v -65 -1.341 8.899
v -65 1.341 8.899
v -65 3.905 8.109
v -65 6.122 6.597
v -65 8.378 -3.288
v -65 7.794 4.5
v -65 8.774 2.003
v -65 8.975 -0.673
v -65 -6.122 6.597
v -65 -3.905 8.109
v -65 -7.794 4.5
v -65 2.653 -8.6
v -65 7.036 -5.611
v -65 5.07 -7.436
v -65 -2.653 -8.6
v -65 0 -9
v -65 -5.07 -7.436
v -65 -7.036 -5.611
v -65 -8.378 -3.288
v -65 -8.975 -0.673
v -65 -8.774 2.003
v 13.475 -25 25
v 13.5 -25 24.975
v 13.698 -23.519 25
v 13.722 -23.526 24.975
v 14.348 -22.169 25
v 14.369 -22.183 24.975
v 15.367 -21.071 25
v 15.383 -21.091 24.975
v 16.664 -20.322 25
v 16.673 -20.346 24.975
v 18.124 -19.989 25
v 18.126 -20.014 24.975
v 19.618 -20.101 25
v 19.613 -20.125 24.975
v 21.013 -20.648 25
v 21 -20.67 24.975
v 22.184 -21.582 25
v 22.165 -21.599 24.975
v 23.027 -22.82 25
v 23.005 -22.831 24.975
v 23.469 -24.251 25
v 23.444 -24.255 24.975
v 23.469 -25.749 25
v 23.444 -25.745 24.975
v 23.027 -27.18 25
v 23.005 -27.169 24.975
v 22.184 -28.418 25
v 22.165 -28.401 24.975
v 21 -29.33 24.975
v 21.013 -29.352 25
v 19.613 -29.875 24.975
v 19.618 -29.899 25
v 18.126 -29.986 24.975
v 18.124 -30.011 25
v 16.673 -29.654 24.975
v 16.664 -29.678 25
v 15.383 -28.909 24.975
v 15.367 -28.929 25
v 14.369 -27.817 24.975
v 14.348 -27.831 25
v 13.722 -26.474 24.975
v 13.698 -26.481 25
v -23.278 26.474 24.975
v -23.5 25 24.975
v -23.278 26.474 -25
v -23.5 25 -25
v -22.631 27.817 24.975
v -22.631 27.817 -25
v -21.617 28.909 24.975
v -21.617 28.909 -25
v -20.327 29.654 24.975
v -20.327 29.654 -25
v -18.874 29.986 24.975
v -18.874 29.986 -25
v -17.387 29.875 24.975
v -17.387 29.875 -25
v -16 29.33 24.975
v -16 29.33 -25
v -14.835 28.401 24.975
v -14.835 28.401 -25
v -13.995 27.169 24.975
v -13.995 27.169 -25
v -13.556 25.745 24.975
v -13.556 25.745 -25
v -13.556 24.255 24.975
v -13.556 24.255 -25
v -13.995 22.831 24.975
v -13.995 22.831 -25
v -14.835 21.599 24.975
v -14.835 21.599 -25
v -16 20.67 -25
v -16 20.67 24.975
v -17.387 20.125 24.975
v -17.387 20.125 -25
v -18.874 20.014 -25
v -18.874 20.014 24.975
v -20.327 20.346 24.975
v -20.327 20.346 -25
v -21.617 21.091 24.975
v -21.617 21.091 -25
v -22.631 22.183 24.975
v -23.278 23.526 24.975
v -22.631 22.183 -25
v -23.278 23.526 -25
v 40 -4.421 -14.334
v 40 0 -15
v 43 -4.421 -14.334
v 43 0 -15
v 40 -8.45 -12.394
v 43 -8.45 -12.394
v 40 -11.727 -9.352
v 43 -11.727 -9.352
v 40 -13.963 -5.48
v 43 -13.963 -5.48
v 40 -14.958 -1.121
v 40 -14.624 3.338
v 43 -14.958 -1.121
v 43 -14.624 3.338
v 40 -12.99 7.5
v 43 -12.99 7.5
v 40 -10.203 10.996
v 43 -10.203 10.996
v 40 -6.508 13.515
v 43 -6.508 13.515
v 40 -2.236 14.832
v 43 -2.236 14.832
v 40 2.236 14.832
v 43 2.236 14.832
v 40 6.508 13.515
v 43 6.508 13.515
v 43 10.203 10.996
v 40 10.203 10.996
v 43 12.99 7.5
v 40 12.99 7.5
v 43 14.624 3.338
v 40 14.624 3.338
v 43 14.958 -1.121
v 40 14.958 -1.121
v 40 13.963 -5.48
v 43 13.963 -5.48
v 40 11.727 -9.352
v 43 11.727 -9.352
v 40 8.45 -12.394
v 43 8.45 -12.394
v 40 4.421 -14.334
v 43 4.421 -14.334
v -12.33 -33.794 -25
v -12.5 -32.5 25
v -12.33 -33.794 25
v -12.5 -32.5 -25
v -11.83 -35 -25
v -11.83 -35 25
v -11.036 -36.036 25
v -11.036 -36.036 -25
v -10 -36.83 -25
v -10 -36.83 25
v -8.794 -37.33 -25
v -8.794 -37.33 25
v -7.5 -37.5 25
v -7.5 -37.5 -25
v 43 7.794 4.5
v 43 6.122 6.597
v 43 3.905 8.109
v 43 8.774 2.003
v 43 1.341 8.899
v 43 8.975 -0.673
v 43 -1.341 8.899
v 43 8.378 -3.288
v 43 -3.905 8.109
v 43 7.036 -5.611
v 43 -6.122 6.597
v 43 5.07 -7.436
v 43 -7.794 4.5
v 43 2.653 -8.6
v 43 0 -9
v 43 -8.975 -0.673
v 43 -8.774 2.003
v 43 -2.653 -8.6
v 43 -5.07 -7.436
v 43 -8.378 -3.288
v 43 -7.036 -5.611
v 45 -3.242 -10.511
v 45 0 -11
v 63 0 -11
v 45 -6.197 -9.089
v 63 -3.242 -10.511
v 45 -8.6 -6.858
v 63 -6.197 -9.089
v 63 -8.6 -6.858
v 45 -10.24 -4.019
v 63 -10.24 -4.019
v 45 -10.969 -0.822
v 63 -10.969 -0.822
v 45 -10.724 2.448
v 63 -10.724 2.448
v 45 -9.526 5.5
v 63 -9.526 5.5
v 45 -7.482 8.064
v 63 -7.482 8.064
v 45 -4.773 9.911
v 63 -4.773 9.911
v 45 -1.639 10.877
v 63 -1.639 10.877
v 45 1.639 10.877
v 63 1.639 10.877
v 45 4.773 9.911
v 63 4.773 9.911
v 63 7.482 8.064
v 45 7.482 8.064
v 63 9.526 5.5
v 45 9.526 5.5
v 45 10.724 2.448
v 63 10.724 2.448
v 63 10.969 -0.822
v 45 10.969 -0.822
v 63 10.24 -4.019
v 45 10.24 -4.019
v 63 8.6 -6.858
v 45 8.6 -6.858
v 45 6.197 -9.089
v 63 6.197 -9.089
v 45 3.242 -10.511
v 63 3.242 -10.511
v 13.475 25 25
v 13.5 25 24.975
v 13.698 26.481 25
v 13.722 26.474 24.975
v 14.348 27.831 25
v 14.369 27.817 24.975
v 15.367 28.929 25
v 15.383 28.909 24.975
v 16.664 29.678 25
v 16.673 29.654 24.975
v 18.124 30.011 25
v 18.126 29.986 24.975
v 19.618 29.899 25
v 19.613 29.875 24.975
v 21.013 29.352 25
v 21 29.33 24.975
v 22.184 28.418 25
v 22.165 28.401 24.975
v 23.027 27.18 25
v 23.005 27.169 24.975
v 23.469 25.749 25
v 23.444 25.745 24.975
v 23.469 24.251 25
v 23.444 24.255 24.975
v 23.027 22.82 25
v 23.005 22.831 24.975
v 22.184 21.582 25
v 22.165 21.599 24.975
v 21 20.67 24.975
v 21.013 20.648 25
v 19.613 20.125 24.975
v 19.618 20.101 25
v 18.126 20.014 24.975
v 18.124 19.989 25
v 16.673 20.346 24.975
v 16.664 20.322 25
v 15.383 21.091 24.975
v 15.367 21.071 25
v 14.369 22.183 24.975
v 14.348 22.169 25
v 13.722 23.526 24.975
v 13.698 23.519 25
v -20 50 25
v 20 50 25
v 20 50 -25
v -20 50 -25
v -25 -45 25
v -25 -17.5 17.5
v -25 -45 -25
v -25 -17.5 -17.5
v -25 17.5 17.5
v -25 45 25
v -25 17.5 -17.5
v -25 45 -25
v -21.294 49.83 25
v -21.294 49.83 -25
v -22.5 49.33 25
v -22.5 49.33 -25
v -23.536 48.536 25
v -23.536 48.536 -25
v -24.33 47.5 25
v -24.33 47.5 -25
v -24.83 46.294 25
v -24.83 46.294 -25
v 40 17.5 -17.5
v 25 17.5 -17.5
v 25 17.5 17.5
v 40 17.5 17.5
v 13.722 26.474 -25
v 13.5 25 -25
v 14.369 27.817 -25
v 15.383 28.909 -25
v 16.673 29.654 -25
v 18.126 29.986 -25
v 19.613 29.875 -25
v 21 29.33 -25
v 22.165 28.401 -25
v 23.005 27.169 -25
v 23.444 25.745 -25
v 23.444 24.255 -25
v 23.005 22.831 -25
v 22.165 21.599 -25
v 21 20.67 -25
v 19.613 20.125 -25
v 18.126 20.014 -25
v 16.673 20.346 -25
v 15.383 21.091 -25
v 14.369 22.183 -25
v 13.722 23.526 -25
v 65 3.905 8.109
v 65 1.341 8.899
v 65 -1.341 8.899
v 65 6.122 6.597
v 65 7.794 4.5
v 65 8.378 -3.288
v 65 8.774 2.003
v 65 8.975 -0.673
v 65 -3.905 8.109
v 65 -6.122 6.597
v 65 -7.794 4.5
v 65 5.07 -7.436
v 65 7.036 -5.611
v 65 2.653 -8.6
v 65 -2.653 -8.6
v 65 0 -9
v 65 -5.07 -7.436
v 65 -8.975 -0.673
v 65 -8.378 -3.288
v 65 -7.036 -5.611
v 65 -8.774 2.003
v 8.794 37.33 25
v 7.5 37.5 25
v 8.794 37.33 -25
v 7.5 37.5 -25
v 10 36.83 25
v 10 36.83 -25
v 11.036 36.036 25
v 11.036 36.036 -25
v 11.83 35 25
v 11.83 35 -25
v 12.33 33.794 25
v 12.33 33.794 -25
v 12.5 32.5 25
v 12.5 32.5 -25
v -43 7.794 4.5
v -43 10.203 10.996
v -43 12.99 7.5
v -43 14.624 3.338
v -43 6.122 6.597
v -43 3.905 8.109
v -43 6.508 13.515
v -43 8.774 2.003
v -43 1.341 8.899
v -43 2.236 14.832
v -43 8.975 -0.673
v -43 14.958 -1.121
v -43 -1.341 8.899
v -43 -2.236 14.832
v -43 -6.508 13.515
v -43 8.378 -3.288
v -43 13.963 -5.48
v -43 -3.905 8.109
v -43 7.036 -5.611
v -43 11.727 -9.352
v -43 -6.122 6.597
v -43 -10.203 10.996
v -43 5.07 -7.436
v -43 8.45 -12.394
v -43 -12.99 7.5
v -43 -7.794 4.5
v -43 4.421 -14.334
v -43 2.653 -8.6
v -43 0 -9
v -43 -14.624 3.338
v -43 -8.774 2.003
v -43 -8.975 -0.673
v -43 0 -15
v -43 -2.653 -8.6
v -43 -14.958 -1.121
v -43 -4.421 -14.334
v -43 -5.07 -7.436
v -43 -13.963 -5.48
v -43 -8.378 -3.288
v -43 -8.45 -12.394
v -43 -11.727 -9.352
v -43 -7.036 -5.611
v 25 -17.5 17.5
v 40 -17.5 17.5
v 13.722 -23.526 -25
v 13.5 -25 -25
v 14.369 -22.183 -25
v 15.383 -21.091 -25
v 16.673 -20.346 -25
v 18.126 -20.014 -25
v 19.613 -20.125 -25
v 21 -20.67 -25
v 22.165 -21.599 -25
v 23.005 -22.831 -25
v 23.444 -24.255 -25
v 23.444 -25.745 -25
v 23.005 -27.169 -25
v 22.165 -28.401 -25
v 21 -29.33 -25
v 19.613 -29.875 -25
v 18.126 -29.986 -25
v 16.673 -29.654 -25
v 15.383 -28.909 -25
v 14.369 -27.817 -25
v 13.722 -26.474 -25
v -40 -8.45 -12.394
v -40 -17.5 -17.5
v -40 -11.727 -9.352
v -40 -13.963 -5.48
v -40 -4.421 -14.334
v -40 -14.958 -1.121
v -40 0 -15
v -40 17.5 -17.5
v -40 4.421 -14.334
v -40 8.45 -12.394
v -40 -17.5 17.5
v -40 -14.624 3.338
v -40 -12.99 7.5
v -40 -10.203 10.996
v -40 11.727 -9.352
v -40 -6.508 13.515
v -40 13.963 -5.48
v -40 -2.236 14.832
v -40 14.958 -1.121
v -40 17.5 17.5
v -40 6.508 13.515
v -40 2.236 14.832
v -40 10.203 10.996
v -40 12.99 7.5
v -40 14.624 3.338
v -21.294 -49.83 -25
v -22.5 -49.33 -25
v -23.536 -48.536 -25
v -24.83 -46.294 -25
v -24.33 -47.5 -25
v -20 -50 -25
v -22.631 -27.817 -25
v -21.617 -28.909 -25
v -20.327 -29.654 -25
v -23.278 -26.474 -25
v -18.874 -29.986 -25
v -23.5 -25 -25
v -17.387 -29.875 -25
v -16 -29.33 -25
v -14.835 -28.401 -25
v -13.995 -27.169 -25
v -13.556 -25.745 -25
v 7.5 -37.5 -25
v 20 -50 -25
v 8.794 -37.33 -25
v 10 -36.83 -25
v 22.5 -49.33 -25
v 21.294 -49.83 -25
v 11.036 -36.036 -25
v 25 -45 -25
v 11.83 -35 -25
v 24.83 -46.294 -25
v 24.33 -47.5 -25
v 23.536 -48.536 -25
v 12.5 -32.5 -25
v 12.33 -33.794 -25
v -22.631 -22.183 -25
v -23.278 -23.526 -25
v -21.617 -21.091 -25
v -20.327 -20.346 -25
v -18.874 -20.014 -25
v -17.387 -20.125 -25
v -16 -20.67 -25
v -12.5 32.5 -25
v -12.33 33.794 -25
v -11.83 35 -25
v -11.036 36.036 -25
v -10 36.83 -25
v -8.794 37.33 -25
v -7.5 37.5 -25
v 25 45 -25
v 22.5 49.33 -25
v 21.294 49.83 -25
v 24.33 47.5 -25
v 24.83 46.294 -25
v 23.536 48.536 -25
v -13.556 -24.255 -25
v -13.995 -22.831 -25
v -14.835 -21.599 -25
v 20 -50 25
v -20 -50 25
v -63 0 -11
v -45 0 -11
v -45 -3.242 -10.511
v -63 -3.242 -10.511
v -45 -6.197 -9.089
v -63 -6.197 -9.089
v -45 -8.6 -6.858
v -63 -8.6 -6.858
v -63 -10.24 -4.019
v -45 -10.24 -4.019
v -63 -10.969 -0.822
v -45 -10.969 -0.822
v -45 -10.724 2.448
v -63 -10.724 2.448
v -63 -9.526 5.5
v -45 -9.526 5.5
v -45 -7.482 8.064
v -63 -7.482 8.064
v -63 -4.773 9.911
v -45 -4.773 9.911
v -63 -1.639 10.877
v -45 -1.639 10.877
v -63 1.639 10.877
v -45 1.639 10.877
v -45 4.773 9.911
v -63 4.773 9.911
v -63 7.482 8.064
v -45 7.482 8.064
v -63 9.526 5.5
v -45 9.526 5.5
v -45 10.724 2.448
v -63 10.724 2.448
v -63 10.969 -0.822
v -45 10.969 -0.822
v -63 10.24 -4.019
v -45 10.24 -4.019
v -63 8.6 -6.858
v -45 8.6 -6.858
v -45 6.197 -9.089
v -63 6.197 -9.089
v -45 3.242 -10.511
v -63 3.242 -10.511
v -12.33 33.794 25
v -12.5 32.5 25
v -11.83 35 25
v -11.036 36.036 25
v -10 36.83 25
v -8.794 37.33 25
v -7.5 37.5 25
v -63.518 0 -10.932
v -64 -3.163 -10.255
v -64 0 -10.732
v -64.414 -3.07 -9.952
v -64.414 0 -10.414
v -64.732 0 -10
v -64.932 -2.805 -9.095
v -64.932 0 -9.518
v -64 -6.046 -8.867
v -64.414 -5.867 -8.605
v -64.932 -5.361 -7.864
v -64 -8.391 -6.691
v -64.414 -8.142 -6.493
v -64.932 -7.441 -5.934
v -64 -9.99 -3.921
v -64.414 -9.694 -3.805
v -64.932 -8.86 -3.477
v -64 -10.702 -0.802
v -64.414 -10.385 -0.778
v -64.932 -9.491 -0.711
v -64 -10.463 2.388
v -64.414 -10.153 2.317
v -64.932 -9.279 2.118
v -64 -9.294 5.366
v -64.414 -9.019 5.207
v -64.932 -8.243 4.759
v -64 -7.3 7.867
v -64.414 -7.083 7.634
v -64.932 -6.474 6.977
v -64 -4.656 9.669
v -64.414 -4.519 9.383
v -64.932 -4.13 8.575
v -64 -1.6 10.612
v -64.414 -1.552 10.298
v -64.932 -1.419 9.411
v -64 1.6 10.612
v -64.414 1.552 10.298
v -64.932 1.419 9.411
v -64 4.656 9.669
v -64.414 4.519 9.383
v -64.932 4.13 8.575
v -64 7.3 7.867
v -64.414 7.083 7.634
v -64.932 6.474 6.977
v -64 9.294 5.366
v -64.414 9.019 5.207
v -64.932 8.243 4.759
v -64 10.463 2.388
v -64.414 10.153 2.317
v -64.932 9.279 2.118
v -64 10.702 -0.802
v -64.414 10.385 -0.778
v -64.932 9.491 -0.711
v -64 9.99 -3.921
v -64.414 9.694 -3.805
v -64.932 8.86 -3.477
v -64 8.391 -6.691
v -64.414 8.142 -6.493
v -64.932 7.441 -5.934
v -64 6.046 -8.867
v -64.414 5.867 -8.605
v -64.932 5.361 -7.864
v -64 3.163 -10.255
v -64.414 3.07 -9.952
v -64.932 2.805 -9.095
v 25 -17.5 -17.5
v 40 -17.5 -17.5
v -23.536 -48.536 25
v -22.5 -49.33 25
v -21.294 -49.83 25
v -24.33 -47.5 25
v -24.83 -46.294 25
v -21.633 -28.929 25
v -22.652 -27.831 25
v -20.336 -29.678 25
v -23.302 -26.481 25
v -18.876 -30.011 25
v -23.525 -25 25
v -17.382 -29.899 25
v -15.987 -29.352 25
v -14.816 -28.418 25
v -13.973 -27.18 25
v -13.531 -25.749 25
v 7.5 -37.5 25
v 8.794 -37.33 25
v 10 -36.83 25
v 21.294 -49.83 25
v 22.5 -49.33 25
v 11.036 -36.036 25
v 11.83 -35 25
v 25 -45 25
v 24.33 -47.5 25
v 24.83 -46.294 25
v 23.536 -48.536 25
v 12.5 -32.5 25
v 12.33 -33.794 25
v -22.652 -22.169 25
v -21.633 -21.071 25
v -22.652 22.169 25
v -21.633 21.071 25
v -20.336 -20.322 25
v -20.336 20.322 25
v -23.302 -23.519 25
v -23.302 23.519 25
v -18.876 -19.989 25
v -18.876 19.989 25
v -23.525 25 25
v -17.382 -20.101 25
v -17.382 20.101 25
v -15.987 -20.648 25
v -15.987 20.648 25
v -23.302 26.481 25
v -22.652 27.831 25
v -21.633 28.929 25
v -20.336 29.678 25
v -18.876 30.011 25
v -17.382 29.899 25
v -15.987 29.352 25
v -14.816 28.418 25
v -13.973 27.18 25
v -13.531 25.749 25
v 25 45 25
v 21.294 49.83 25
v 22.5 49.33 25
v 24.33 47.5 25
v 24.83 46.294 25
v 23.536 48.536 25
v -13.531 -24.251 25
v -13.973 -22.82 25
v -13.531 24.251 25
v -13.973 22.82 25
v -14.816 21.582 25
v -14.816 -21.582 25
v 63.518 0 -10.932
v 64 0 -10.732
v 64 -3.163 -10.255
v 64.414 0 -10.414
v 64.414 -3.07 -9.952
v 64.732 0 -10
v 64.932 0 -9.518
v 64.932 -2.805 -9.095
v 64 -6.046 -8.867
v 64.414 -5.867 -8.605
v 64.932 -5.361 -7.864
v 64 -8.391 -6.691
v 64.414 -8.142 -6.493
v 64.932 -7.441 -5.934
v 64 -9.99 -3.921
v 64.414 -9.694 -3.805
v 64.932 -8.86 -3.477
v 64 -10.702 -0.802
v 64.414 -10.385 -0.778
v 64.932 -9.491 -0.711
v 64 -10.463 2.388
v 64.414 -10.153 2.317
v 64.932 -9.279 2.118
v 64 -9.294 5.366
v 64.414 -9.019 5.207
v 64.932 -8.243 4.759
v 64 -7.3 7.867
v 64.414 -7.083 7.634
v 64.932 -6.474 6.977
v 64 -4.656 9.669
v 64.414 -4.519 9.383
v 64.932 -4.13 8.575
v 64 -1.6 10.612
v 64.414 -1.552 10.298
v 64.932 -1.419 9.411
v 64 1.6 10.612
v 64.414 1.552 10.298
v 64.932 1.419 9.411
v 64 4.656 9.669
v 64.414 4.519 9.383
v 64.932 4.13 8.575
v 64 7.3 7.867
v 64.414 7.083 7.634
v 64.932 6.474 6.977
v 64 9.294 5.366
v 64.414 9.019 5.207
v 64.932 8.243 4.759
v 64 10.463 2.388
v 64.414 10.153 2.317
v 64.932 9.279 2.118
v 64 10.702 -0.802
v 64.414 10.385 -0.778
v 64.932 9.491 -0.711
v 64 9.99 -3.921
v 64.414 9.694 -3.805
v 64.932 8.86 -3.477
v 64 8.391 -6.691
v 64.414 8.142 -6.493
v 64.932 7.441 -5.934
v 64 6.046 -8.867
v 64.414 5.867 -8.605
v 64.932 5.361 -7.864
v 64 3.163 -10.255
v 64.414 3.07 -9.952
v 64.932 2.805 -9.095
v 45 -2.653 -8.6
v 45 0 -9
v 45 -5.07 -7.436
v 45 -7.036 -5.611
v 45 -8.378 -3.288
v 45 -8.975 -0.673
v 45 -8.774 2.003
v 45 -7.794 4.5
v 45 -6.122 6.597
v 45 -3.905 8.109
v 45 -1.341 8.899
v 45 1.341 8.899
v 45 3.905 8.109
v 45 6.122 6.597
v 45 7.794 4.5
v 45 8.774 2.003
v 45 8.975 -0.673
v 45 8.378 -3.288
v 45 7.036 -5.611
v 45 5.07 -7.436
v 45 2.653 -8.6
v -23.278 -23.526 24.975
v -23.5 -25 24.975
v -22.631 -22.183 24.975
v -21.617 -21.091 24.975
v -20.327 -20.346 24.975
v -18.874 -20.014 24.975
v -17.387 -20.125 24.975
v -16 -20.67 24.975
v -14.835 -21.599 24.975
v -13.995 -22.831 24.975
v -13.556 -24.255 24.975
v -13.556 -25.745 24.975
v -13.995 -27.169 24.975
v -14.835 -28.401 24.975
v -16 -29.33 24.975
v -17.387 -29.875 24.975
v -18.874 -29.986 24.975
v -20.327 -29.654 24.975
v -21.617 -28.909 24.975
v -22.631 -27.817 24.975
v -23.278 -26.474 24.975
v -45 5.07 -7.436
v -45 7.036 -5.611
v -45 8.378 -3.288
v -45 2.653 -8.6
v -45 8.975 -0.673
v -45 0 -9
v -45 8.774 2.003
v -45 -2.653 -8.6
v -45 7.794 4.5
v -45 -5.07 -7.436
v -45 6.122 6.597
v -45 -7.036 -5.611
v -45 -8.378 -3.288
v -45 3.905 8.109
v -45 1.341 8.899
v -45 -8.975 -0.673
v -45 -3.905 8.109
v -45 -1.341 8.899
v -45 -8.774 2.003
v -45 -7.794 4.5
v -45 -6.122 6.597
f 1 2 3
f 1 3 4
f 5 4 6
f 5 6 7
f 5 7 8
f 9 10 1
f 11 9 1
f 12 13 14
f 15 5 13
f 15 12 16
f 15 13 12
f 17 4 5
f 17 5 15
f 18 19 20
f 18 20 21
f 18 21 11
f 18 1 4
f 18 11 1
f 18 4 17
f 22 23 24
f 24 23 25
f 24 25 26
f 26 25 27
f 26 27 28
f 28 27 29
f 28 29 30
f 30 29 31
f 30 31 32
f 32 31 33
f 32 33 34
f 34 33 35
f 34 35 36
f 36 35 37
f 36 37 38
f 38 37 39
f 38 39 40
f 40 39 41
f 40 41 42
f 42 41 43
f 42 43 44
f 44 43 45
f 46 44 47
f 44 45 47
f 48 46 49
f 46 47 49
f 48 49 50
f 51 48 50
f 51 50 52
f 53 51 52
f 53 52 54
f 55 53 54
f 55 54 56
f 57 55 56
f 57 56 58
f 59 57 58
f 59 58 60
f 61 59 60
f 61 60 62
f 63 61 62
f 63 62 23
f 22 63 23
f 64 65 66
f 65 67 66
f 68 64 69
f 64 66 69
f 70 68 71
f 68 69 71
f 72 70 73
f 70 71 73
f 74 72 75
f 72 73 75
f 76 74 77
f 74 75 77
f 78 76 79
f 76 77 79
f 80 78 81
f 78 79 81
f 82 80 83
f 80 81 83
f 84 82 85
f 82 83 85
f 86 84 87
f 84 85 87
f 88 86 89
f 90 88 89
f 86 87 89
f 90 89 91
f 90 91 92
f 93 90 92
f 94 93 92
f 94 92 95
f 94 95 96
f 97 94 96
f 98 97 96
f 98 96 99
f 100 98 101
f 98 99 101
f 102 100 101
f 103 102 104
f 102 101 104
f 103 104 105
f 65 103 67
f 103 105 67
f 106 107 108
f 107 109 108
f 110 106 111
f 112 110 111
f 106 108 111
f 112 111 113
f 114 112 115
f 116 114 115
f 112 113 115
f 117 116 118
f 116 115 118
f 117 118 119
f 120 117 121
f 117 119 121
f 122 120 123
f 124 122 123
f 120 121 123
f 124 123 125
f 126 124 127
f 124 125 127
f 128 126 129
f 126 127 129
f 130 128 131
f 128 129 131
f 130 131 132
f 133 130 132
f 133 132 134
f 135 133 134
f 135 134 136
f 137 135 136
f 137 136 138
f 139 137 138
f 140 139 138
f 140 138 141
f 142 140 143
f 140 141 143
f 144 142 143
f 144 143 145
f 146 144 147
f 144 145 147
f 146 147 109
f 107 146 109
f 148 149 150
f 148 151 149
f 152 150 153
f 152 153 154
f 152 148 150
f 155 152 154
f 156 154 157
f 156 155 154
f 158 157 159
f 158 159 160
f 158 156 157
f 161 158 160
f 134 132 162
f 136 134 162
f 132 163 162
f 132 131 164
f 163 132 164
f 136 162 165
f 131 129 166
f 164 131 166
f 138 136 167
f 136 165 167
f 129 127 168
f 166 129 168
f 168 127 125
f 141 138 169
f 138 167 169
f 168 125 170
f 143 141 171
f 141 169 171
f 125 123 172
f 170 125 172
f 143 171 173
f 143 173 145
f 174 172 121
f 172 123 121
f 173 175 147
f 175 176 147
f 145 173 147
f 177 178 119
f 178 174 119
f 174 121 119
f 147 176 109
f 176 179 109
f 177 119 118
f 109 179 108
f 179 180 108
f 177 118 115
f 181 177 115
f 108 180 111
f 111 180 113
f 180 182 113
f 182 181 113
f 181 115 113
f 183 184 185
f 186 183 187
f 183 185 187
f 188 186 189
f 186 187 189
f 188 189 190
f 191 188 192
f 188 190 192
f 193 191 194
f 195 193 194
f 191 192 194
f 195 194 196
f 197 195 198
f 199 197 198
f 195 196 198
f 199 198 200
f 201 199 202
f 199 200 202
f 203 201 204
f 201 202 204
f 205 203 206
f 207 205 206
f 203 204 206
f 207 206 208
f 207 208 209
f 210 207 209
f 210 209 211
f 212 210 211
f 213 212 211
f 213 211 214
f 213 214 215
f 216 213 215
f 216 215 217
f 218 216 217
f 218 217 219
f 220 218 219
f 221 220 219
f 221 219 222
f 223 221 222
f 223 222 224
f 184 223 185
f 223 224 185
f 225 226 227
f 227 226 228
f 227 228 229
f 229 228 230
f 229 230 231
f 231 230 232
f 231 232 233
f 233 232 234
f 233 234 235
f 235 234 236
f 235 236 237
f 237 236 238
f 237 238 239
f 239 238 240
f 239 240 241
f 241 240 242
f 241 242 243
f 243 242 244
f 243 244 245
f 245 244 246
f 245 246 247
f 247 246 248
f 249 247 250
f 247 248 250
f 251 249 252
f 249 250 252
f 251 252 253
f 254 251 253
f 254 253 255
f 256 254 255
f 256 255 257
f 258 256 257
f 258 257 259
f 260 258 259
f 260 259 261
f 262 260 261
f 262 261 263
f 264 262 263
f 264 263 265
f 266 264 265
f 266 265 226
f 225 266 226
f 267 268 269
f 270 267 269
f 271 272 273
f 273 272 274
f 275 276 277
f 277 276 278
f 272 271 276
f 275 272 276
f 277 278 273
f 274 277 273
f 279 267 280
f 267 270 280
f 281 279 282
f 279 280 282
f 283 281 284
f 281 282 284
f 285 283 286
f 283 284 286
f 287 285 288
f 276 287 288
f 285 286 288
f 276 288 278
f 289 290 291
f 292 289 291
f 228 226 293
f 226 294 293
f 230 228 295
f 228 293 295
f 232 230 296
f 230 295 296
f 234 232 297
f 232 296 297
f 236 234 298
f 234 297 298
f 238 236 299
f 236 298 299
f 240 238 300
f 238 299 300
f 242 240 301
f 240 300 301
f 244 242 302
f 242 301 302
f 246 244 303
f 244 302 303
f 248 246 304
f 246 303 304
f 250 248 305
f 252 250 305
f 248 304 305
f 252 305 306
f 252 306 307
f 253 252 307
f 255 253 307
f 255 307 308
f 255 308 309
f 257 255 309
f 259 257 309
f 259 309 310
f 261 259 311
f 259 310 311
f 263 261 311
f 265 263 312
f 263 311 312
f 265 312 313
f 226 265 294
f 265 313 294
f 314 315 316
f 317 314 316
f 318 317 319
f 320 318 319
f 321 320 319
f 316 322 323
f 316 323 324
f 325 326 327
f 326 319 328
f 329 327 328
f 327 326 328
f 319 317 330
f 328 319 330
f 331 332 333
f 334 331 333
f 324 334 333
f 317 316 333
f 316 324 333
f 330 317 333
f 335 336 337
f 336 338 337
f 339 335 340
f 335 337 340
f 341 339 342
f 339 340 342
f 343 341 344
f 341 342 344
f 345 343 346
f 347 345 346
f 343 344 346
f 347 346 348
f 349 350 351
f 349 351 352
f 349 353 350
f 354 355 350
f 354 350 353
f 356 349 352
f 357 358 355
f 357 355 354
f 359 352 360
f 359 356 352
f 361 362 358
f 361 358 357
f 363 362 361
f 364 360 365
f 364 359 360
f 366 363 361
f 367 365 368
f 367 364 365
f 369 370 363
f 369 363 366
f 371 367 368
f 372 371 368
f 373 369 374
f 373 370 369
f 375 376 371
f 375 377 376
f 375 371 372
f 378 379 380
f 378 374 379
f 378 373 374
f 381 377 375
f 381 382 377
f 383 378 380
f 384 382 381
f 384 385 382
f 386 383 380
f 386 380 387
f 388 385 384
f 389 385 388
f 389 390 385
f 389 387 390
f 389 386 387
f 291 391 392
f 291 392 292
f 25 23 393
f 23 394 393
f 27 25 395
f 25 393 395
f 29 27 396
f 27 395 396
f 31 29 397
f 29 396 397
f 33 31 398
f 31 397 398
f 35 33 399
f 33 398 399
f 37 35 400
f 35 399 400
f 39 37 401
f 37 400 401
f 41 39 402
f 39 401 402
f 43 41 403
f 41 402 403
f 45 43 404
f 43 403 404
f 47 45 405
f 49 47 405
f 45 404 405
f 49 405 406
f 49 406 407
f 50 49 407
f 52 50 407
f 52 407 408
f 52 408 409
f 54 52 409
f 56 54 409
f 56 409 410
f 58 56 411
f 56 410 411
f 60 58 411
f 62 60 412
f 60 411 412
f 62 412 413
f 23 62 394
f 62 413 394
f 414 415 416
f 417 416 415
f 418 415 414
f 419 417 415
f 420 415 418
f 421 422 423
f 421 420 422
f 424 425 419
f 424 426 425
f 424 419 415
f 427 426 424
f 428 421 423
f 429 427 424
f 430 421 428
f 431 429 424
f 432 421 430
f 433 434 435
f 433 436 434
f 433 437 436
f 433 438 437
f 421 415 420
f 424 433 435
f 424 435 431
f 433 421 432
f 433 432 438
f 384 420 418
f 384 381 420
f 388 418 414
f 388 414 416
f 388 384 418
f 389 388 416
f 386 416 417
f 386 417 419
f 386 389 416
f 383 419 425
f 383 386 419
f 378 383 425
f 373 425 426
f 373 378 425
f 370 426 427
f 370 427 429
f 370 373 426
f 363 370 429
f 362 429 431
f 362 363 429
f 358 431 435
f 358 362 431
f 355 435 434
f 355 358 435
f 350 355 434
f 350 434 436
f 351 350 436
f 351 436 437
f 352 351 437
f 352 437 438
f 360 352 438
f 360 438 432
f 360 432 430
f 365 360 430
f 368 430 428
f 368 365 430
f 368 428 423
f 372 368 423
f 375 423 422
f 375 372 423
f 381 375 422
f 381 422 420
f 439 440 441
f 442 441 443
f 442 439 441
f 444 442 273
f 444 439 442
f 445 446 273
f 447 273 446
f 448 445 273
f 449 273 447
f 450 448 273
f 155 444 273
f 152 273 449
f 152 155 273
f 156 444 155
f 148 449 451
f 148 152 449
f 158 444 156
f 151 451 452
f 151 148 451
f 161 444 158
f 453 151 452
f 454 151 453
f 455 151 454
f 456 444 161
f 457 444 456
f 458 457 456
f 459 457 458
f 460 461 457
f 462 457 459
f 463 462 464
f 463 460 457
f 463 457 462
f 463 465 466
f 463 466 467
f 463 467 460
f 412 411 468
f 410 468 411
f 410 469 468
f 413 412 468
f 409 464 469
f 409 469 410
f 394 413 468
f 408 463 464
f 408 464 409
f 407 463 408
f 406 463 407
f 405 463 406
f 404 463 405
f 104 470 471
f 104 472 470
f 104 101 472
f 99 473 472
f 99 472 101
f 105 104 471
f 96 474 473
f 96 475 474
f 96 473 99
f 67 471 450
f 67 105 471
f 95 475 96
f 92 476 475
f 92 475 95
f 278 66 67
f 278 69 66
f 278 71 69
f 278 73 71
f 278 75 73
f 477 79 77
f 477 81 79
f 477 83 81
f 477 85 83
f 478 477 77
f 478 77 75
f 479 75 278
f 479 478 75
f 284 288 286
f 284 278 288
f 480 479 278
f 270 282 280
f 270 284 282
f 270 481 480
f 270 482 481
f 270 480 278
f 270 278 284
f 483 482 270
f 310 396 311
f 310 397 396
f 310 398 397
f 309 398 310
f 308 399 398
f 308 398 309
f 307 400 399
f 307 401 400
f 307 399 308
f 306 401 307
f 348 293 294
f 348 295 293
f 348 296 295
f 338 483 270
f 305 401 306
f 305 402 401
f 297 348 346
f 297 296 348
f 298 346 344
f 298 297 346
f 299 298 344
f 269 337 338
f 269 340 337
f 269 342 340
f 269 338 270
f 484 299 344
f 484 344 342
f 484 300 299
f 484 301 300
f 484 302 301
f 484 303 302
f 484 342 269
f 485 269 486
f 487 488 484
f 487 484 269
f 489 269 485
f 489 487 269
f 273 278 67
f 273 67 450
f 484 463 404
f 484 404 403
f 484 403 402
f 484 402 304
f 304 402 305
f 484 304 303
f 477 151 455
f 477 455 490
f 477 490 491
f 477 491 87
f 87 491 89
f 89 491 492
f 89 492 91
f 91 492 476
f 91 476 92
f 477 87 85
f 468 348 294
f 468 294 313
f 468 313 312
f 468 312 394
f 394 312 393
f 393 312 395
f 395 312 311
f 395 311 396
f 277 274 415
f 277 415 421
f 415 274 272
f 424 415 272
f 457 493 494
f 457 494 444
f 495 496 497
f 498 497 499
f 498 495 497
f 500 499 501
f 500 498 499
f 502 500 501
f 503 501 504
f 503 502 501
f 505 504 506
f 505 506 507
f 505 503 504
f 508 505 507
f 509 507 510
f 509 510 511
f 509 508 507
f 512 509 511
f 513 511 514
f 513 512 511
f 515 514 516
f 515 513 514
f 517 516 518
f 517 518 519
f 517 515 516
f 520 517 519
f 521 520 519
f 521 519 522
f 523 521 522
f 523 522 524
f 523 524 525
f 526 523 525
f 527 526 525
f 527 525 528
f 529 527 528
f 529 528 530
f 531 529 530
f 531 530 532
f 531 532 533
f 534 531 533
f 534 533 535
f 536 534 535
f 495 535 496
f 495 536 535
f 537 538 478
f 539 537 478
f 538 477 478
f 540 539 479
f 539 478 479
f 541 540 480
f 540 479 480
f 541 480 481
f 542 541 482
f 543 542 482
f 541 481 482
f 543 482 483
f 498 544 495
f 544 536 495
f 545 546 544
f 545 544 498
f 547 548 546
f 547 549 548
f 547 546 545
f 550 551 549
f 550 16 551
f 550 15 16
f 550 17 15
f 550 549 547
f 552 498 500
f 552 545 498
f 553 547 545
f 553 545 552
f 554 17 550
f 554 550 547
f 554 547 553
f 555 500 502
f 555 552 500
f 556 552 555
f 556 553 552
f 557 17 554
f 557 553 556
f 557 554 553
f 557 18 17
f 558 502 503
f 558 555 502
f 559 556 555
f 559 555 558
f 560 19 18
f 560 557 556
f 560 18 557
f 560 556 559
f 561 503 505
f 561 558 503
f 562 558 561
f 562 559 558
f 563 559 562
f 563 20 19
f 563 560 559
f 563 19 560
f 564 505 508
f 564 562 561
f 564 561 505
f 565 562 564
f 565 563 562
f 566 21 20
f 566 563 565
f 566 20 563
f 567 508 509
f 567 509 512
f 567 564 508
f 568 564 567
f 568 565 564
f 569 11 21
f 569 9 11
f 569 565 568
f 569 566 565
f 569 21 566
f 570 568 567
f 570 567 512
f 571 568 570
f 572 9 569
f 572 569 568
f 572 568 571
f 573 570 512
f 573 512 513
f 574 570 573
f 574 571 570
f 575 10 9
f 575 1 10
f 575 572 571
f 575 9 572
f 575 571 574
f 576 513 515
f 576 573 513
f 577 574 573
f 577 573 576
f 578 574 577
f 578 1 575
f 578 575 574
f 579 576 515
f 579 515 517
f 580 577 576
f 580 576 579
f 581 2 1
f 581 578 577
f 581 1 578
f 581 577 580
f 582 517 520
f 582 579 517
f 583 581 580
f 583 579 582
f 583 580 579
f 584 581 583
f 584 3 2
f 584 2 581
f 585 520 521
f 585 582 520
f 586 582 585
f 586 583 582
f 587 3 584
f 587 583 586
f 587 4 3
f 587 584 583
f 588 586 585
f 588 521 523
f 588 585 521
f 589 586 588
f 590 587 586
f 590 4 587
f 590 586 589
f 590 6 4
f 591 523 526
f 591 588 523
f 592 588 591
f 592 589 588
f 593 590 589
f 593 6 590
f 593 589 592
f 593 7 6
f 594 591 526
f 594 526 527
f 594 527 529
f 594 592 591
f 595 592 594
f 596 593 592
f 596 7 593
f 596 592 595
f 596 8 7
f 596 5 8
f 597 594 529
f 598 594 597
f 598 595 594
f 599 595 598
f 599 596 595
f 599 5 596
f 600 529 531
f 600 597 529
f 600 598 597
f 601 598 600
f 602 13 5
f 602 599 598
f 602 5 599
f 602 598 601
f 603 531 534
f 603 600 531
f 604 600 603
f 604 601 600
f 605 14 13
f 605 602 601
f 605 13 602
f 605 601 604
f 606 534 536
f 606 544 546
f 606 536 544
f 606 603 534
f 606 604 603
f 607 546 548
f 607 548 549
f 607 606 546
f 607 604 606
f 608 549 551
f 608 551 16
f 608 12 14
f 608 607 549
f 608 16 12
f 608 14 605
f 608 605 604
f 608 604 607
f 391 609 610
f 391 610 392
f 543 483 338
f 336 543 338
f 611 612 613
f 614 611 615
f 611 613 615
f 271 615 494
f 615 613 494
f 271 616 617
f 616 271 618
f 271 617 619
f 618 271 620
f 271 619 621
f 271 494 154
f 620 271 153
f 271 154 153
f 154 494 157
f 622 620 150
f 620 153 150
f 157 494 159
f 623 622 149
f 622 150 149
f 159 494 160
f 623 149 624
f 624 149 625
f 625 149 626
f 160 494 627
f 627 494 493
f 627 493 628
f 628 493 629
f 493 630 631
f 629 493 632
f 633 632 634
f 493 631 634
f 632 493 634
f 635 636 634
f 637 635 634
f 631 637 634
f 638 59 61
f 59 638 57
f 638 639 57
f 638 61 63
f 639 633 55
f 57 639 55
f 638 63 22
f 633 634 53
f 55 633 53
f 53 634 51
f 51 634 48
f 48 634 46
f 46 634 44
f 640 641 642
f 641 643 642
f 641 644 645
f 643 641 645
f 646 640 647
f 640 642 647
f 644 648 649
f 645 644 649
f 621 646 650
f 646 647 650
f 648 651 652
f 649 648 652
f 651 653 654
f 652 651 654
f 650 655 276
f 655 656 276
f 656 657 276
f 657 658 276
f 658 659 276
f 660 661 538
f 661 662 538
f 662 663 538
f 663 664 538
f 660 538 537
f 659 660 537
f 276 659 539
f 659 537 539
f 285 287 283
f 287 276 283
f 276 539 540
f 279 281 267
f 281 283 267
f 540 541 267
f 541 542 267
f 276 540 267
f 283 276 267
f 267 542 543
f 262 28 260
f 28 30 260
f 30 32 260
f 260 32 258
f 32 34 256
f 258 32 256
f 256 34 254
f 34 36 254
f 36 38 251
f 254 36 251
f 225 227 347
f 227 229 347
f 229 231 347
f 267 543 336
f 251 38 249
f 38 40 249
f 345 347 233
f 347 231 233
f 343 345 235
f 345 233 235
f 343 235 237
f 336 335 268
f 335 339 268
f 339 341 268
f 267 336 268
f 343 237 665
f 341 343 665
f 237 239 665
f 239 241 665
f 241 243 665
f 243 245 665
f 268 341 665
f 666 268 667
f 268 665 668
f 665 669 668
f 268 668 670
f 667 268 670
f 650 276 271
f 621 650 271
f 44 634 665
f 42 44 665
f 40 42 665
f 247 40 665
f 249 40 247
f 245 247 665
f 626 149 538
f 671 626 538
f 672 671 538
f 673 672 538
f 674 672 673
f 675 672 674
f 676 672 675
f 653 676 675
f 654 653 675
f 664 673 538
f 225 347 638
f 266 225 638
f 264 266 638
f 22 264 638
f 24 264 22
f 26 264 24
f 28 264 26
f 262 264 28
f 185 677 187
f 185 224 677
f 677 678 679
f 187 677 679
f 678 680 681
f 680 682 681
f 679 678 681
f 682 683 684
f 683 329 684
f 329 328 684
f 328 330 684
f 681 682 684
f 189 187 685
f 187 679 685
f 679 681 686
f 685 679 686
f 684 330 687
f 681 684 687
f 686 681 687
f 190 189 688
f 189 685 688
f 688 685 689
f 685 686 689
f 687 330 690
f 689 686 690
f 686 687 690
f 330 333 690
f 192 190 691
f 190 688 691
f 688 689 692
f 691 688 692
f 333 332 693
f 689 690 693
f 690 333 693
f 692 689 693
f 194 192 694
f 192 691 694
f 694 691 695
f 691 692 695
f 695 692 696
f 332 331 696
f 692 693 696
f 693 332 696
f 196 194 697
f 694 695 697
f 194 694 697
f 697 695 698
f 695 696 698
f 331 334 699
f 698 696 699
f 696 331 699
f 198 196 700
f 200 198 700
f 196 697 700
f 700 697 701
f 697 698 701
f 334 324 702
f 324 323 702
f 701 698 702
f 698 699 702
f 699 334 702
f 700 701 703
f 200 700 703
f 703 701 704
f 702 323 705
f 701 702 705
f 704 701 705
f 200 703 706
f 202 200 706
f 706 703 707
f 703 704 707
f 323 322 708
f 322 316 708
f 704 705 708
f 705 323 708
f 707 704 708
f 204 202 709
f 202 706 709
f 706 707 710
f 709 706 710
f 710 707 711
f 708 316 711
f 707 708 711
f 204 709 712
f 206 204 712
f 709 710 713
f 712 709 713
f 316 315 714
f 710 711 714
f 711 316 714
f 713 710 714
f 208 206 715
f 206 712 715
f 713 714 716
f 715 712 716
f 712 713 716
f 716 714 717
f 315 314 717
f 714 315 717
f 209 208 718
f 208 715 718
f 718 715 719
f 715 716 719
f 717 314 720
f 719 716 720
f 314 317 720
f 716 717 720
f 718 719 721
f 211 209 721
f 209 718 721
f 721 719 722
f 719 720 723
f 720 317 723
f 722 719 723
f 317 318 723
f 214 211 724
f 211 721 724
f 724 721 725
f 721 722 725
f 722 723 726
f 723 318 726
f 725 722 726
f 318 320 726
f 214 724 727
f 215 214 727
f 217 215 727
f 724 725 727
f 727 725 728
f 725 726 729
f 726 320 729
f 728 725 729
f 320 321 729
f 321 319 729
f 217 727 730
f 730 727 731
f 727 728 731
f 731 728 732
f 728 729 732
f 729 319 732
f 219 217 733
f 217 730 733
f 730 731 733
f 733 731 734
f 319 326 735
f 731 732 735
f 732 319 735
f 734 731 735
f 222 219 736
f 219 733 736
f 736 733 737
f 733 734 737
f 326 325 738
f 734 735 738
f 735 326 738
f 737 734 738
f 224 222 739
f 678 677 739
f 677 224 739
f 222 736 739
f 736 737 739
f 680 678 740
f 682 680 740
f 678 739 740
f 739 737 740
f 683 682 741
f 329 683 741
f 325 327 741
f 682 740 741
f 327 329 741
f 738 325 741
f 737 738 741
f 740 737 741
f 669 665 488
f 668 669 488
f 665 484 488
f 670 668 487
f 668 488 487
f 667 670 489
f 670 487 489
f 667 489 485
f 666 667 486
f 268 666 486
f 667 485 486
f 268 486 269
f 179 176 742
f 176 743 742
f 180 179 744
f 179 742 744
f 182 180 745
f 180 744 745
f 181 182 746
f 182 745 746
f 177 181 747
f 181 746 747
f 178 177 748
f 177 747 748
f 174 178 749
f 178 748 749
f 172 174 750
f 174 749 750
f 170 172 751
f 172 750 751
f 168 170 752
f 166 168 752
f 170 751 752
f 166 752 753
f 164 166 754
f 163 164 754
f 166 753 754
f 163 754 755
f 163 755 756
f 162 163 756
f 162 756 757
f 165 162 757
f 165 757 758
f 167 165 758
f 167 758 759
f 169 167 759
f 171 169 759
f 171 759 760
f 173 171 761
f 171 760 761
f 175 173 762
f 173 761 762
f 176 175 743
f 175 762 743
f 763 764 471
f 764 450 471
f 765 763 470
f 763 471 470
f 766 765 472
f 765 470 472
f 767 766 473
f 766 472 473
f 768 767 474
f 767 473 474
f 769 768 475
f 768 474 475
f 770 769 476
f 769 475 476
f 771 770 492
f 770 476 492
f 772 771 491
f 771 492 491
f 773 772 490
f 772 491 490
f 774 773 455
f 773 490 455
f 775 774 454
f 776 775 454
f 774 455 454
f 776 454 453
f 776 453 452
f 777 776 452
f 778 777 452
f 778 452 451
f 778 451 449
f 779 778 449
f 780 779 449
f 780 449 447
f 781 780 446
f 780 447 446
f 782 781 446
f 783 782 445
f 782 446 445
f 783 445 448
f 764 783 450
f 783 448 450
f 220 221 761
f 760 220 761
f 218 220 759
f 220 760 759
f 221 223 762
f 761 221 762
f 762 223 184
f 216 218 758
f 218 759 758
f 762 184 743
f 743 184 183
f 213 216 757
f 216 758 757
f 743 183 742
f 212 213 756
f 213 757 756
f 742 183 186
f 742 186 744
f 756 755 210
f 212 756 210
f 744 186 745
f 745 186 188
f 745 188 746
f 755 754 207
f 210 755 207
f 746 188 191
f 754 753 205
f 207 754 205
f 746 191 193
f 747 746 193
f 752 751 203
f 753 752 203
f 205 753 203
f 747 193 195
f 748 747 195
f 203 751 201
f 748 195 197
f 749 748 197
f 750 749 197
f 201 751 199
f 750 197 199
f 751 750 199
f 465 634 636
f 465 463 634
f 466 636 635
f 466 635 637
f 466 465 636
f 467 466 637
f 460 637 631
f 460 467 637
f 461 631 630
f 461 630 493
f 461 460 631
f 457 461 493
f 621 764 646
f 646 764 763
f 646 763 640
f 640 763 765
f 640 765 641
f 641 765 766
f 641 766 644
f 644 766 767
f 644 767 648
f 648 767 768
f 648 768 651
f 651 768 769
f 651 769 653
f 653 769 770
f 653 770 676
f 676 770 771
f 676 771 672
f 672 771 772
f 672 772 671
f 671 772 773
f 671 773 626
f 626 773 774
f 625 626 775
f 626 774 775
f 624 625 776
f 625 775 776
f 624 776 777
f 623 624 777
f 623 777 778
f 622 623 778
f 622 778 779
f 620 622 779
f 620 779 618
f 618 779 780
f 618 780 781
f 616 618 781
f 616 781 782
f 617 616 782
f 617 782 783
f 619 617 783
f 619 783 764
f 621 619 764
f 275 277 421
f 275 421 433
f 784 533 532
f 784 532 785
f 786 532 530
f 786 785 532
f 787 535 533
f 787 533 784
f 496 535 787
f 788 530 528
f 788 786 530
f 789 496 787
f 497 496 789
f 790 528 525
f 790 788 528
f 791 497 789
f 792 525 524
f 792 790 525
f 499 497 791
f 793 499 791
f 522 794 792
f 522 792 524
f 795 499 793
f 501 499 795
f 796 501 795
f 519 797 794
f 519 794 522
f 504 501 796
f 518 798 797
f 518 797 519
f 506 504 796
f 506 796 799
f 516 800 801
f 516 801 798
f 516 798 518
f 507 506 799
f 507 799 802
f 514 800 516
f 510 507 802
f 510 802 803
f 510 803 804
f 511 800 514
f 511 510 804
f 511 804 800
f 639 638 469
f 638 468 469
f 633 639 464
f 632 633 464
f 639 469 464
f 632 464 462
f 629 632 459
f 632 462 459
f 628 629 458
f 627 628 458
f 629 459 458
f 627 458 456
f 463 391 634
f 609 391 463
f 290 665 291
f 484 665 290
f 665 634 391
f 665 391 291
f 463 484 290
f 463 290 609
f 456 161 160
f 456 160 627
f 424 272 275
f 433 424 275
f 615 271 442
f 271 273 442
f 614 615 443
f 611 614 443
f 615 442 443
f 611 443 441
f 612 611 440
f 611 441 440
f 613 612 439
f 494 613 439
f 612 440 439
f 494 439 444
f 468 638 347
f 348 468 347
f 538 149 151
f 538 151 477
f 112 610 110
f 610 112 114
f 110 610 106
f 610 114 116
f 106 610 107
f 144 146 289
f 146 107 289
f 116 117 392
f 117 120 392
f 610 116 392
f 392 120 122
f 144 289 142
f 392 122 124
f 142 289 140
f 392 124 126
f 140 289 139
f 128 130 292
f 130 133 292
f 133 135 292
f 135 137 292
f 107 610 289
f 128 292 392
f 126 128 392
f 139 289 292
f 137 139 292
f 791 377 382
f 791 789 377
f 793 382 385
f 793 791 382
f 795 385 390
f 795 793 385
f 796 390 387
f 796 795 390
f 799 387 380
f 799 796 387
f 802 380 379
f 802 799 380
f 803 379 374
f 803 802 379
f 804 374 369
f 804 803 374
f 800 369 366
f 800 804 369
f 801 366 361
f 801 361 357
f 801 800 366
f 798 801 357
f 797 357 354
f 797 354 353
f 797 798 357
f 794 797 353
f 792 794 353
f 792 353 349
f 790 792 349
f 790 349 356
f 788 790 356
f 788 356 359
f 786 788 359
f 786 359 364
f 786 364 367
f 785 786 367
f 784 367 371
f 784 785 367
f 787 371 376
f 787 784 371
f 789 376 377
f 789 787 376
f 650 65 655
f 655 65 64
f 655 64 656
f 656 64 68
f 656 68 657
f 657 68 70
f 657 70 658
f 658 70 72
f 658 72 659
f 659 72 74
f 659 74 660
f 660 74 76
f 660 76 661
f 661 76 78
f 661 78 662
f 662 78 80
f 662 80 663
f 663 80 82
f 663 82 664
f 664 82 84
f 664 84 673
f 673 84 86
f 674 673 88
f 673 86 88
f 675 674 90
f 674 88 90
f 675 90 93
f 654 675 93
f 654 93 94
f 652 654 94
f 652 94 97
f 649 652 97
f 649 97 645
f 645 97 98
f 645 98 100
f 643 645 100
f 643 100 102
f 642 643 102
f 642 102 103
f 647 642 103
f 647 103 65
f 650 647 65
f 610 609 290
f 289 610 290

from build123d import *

# Parameters (mm, degrees)
SKETCH1_W                        = 50
SKETCH1_H                        = 100
BOSS_EXTRUDE1_DEPTH              = 25
FILLET1_R                        = 5
SKETCH2_W                        = 25
SKETCH2_H                        = 75
CUT_EXTRUDE1_DEPTH               = 50
FILLET2_R                        = 5
SKETCH4_W                        = 35
SKETCH4_H                        = 35
BOSS_EXTRUDE2_DEPTH              = 15
FILLET7_R                        = 2
FILLET8_R                        = 2
F_10_0MM_DOWEL_HOLE1_D           = 10
F_10_0MM_DOWEL_HOLE1_CSINK_D     = 10.05
F_10_0MM_DOWEL_HOLE1_CSINK_ANGLE = 90


with BuildPart() as part:
    # Sketch1 → Boss-Extrude1 (new, symmetric)
    with BuildSketch(Plane(origin=(0, 0, 0), x_dir=(0, 0, -1), z_dir=(1, 0, 0))):
        Rectangle(SKETCH1_W, SKETCH1_H)
    extrude(amount=BOSS_EXTRUDE1_DEPTH, both=True)

    # Fillet1
    fillet1_edges = [part.edges().sort_by_distance(p)[0] for p in [
        (25, -50, 0),
        (-25, -50, 0),
        (-25, 50, 0),
        (25, 50, 0),
    ]]
    fillet(fillet1_edges, radius=FILLET1_R)

    # Sketch2 → Cut-Extrude1 (cut)
    with BuildSketch(Plane.XY.offset(25)):
        Rectangle(SKETCH2_W, SKETCH2_H)
    extrude(amount=-CUT_EXTRUDE1_DEPTH, mode=Mode.SUBTRACT)

    # Fillet2
    fillet2_edges = [part.edges().sort_by_distance(p)[0] for p in [
        (12.5, 37.5, 0),
        (12.5, -37.5, 0),
        (-12.5, -37.5, 0),
        (-12.5, 37.5, 0),
    ]]
    fillet(fillet2_edges, radius=FILLET2_R)

    # Sketch4 → Boss-Extrude2 (add)
    with BuildSketch(Plane.ZY.offset(25)):
        Rectangle(SKETCH4_W, SKETCH4_H)
    boss_extrude2 = extrude(amount=BOSS_EXTRUDE2_DEPTH)

    # Mirror1: Boss-Extrude2 across plane
    add(boss_extrude2.mirror(Plane(origin=(0, 0, 0), x_dir=(0, 0, 1), z_dir=(1, 0, 0))))

    # Sketch6 → Revolve1 (revolve)
    with BuildSketch(Plane.XY, mode=Mode.PRIVATE) as revolve1_sk:
        Polygon((-40, 15), (-43, 15), (-43, 9), (-45, 9), (-45, 11), (-65, 11), (-65, 0), (-40, 0), align=None)
    revolve1 = revolve(revolve1_sk.sketch.rotate(Axis((0, 0, 0), (-1, 0, 0)), 90), axis=Axis((0, 0, 0), (-1, 0, 0)))

    # Mirror2: Revolve1 across plane
    add(revolve1.mirror(Plane(origin=(0, 0, 0), x_dir=(0, 0, 1), z_dir=(1, 0, 0))))

    # Fillet7
    fillet7_edges = [part.edges().sort_by_distance(p)[0] for p in [
        (-65, 0, 11),
    ]]
    fillet(fillet7_edges, radius=FILLET7_R)

    # Fillet8
    fillet8_edges = [part.edges().sort_by_distance(p)[0] for p in [
        (65, 0, 11),
    ]]
    fillet(fillet8_edges, radius=FILLET8_R)

    # Ø10.0mm Dowel Hole1 (through all)
    with Locations(Plane.XY.offset(25)):
        with Locations((18.5, 25), (18.5, -25), (-18.5, -25), (-18.5, 25)):
            CounterSinkHole(F_10_0MM_DOWEL_HOLE1_D / 2, F_10_0MM_DOWEL_HOLE1_CSINK_D / 2, counter_sink_angle=F_10_0MM_DOWEL_HOLE1_CSINK_ANGLE)


solid = part.part
